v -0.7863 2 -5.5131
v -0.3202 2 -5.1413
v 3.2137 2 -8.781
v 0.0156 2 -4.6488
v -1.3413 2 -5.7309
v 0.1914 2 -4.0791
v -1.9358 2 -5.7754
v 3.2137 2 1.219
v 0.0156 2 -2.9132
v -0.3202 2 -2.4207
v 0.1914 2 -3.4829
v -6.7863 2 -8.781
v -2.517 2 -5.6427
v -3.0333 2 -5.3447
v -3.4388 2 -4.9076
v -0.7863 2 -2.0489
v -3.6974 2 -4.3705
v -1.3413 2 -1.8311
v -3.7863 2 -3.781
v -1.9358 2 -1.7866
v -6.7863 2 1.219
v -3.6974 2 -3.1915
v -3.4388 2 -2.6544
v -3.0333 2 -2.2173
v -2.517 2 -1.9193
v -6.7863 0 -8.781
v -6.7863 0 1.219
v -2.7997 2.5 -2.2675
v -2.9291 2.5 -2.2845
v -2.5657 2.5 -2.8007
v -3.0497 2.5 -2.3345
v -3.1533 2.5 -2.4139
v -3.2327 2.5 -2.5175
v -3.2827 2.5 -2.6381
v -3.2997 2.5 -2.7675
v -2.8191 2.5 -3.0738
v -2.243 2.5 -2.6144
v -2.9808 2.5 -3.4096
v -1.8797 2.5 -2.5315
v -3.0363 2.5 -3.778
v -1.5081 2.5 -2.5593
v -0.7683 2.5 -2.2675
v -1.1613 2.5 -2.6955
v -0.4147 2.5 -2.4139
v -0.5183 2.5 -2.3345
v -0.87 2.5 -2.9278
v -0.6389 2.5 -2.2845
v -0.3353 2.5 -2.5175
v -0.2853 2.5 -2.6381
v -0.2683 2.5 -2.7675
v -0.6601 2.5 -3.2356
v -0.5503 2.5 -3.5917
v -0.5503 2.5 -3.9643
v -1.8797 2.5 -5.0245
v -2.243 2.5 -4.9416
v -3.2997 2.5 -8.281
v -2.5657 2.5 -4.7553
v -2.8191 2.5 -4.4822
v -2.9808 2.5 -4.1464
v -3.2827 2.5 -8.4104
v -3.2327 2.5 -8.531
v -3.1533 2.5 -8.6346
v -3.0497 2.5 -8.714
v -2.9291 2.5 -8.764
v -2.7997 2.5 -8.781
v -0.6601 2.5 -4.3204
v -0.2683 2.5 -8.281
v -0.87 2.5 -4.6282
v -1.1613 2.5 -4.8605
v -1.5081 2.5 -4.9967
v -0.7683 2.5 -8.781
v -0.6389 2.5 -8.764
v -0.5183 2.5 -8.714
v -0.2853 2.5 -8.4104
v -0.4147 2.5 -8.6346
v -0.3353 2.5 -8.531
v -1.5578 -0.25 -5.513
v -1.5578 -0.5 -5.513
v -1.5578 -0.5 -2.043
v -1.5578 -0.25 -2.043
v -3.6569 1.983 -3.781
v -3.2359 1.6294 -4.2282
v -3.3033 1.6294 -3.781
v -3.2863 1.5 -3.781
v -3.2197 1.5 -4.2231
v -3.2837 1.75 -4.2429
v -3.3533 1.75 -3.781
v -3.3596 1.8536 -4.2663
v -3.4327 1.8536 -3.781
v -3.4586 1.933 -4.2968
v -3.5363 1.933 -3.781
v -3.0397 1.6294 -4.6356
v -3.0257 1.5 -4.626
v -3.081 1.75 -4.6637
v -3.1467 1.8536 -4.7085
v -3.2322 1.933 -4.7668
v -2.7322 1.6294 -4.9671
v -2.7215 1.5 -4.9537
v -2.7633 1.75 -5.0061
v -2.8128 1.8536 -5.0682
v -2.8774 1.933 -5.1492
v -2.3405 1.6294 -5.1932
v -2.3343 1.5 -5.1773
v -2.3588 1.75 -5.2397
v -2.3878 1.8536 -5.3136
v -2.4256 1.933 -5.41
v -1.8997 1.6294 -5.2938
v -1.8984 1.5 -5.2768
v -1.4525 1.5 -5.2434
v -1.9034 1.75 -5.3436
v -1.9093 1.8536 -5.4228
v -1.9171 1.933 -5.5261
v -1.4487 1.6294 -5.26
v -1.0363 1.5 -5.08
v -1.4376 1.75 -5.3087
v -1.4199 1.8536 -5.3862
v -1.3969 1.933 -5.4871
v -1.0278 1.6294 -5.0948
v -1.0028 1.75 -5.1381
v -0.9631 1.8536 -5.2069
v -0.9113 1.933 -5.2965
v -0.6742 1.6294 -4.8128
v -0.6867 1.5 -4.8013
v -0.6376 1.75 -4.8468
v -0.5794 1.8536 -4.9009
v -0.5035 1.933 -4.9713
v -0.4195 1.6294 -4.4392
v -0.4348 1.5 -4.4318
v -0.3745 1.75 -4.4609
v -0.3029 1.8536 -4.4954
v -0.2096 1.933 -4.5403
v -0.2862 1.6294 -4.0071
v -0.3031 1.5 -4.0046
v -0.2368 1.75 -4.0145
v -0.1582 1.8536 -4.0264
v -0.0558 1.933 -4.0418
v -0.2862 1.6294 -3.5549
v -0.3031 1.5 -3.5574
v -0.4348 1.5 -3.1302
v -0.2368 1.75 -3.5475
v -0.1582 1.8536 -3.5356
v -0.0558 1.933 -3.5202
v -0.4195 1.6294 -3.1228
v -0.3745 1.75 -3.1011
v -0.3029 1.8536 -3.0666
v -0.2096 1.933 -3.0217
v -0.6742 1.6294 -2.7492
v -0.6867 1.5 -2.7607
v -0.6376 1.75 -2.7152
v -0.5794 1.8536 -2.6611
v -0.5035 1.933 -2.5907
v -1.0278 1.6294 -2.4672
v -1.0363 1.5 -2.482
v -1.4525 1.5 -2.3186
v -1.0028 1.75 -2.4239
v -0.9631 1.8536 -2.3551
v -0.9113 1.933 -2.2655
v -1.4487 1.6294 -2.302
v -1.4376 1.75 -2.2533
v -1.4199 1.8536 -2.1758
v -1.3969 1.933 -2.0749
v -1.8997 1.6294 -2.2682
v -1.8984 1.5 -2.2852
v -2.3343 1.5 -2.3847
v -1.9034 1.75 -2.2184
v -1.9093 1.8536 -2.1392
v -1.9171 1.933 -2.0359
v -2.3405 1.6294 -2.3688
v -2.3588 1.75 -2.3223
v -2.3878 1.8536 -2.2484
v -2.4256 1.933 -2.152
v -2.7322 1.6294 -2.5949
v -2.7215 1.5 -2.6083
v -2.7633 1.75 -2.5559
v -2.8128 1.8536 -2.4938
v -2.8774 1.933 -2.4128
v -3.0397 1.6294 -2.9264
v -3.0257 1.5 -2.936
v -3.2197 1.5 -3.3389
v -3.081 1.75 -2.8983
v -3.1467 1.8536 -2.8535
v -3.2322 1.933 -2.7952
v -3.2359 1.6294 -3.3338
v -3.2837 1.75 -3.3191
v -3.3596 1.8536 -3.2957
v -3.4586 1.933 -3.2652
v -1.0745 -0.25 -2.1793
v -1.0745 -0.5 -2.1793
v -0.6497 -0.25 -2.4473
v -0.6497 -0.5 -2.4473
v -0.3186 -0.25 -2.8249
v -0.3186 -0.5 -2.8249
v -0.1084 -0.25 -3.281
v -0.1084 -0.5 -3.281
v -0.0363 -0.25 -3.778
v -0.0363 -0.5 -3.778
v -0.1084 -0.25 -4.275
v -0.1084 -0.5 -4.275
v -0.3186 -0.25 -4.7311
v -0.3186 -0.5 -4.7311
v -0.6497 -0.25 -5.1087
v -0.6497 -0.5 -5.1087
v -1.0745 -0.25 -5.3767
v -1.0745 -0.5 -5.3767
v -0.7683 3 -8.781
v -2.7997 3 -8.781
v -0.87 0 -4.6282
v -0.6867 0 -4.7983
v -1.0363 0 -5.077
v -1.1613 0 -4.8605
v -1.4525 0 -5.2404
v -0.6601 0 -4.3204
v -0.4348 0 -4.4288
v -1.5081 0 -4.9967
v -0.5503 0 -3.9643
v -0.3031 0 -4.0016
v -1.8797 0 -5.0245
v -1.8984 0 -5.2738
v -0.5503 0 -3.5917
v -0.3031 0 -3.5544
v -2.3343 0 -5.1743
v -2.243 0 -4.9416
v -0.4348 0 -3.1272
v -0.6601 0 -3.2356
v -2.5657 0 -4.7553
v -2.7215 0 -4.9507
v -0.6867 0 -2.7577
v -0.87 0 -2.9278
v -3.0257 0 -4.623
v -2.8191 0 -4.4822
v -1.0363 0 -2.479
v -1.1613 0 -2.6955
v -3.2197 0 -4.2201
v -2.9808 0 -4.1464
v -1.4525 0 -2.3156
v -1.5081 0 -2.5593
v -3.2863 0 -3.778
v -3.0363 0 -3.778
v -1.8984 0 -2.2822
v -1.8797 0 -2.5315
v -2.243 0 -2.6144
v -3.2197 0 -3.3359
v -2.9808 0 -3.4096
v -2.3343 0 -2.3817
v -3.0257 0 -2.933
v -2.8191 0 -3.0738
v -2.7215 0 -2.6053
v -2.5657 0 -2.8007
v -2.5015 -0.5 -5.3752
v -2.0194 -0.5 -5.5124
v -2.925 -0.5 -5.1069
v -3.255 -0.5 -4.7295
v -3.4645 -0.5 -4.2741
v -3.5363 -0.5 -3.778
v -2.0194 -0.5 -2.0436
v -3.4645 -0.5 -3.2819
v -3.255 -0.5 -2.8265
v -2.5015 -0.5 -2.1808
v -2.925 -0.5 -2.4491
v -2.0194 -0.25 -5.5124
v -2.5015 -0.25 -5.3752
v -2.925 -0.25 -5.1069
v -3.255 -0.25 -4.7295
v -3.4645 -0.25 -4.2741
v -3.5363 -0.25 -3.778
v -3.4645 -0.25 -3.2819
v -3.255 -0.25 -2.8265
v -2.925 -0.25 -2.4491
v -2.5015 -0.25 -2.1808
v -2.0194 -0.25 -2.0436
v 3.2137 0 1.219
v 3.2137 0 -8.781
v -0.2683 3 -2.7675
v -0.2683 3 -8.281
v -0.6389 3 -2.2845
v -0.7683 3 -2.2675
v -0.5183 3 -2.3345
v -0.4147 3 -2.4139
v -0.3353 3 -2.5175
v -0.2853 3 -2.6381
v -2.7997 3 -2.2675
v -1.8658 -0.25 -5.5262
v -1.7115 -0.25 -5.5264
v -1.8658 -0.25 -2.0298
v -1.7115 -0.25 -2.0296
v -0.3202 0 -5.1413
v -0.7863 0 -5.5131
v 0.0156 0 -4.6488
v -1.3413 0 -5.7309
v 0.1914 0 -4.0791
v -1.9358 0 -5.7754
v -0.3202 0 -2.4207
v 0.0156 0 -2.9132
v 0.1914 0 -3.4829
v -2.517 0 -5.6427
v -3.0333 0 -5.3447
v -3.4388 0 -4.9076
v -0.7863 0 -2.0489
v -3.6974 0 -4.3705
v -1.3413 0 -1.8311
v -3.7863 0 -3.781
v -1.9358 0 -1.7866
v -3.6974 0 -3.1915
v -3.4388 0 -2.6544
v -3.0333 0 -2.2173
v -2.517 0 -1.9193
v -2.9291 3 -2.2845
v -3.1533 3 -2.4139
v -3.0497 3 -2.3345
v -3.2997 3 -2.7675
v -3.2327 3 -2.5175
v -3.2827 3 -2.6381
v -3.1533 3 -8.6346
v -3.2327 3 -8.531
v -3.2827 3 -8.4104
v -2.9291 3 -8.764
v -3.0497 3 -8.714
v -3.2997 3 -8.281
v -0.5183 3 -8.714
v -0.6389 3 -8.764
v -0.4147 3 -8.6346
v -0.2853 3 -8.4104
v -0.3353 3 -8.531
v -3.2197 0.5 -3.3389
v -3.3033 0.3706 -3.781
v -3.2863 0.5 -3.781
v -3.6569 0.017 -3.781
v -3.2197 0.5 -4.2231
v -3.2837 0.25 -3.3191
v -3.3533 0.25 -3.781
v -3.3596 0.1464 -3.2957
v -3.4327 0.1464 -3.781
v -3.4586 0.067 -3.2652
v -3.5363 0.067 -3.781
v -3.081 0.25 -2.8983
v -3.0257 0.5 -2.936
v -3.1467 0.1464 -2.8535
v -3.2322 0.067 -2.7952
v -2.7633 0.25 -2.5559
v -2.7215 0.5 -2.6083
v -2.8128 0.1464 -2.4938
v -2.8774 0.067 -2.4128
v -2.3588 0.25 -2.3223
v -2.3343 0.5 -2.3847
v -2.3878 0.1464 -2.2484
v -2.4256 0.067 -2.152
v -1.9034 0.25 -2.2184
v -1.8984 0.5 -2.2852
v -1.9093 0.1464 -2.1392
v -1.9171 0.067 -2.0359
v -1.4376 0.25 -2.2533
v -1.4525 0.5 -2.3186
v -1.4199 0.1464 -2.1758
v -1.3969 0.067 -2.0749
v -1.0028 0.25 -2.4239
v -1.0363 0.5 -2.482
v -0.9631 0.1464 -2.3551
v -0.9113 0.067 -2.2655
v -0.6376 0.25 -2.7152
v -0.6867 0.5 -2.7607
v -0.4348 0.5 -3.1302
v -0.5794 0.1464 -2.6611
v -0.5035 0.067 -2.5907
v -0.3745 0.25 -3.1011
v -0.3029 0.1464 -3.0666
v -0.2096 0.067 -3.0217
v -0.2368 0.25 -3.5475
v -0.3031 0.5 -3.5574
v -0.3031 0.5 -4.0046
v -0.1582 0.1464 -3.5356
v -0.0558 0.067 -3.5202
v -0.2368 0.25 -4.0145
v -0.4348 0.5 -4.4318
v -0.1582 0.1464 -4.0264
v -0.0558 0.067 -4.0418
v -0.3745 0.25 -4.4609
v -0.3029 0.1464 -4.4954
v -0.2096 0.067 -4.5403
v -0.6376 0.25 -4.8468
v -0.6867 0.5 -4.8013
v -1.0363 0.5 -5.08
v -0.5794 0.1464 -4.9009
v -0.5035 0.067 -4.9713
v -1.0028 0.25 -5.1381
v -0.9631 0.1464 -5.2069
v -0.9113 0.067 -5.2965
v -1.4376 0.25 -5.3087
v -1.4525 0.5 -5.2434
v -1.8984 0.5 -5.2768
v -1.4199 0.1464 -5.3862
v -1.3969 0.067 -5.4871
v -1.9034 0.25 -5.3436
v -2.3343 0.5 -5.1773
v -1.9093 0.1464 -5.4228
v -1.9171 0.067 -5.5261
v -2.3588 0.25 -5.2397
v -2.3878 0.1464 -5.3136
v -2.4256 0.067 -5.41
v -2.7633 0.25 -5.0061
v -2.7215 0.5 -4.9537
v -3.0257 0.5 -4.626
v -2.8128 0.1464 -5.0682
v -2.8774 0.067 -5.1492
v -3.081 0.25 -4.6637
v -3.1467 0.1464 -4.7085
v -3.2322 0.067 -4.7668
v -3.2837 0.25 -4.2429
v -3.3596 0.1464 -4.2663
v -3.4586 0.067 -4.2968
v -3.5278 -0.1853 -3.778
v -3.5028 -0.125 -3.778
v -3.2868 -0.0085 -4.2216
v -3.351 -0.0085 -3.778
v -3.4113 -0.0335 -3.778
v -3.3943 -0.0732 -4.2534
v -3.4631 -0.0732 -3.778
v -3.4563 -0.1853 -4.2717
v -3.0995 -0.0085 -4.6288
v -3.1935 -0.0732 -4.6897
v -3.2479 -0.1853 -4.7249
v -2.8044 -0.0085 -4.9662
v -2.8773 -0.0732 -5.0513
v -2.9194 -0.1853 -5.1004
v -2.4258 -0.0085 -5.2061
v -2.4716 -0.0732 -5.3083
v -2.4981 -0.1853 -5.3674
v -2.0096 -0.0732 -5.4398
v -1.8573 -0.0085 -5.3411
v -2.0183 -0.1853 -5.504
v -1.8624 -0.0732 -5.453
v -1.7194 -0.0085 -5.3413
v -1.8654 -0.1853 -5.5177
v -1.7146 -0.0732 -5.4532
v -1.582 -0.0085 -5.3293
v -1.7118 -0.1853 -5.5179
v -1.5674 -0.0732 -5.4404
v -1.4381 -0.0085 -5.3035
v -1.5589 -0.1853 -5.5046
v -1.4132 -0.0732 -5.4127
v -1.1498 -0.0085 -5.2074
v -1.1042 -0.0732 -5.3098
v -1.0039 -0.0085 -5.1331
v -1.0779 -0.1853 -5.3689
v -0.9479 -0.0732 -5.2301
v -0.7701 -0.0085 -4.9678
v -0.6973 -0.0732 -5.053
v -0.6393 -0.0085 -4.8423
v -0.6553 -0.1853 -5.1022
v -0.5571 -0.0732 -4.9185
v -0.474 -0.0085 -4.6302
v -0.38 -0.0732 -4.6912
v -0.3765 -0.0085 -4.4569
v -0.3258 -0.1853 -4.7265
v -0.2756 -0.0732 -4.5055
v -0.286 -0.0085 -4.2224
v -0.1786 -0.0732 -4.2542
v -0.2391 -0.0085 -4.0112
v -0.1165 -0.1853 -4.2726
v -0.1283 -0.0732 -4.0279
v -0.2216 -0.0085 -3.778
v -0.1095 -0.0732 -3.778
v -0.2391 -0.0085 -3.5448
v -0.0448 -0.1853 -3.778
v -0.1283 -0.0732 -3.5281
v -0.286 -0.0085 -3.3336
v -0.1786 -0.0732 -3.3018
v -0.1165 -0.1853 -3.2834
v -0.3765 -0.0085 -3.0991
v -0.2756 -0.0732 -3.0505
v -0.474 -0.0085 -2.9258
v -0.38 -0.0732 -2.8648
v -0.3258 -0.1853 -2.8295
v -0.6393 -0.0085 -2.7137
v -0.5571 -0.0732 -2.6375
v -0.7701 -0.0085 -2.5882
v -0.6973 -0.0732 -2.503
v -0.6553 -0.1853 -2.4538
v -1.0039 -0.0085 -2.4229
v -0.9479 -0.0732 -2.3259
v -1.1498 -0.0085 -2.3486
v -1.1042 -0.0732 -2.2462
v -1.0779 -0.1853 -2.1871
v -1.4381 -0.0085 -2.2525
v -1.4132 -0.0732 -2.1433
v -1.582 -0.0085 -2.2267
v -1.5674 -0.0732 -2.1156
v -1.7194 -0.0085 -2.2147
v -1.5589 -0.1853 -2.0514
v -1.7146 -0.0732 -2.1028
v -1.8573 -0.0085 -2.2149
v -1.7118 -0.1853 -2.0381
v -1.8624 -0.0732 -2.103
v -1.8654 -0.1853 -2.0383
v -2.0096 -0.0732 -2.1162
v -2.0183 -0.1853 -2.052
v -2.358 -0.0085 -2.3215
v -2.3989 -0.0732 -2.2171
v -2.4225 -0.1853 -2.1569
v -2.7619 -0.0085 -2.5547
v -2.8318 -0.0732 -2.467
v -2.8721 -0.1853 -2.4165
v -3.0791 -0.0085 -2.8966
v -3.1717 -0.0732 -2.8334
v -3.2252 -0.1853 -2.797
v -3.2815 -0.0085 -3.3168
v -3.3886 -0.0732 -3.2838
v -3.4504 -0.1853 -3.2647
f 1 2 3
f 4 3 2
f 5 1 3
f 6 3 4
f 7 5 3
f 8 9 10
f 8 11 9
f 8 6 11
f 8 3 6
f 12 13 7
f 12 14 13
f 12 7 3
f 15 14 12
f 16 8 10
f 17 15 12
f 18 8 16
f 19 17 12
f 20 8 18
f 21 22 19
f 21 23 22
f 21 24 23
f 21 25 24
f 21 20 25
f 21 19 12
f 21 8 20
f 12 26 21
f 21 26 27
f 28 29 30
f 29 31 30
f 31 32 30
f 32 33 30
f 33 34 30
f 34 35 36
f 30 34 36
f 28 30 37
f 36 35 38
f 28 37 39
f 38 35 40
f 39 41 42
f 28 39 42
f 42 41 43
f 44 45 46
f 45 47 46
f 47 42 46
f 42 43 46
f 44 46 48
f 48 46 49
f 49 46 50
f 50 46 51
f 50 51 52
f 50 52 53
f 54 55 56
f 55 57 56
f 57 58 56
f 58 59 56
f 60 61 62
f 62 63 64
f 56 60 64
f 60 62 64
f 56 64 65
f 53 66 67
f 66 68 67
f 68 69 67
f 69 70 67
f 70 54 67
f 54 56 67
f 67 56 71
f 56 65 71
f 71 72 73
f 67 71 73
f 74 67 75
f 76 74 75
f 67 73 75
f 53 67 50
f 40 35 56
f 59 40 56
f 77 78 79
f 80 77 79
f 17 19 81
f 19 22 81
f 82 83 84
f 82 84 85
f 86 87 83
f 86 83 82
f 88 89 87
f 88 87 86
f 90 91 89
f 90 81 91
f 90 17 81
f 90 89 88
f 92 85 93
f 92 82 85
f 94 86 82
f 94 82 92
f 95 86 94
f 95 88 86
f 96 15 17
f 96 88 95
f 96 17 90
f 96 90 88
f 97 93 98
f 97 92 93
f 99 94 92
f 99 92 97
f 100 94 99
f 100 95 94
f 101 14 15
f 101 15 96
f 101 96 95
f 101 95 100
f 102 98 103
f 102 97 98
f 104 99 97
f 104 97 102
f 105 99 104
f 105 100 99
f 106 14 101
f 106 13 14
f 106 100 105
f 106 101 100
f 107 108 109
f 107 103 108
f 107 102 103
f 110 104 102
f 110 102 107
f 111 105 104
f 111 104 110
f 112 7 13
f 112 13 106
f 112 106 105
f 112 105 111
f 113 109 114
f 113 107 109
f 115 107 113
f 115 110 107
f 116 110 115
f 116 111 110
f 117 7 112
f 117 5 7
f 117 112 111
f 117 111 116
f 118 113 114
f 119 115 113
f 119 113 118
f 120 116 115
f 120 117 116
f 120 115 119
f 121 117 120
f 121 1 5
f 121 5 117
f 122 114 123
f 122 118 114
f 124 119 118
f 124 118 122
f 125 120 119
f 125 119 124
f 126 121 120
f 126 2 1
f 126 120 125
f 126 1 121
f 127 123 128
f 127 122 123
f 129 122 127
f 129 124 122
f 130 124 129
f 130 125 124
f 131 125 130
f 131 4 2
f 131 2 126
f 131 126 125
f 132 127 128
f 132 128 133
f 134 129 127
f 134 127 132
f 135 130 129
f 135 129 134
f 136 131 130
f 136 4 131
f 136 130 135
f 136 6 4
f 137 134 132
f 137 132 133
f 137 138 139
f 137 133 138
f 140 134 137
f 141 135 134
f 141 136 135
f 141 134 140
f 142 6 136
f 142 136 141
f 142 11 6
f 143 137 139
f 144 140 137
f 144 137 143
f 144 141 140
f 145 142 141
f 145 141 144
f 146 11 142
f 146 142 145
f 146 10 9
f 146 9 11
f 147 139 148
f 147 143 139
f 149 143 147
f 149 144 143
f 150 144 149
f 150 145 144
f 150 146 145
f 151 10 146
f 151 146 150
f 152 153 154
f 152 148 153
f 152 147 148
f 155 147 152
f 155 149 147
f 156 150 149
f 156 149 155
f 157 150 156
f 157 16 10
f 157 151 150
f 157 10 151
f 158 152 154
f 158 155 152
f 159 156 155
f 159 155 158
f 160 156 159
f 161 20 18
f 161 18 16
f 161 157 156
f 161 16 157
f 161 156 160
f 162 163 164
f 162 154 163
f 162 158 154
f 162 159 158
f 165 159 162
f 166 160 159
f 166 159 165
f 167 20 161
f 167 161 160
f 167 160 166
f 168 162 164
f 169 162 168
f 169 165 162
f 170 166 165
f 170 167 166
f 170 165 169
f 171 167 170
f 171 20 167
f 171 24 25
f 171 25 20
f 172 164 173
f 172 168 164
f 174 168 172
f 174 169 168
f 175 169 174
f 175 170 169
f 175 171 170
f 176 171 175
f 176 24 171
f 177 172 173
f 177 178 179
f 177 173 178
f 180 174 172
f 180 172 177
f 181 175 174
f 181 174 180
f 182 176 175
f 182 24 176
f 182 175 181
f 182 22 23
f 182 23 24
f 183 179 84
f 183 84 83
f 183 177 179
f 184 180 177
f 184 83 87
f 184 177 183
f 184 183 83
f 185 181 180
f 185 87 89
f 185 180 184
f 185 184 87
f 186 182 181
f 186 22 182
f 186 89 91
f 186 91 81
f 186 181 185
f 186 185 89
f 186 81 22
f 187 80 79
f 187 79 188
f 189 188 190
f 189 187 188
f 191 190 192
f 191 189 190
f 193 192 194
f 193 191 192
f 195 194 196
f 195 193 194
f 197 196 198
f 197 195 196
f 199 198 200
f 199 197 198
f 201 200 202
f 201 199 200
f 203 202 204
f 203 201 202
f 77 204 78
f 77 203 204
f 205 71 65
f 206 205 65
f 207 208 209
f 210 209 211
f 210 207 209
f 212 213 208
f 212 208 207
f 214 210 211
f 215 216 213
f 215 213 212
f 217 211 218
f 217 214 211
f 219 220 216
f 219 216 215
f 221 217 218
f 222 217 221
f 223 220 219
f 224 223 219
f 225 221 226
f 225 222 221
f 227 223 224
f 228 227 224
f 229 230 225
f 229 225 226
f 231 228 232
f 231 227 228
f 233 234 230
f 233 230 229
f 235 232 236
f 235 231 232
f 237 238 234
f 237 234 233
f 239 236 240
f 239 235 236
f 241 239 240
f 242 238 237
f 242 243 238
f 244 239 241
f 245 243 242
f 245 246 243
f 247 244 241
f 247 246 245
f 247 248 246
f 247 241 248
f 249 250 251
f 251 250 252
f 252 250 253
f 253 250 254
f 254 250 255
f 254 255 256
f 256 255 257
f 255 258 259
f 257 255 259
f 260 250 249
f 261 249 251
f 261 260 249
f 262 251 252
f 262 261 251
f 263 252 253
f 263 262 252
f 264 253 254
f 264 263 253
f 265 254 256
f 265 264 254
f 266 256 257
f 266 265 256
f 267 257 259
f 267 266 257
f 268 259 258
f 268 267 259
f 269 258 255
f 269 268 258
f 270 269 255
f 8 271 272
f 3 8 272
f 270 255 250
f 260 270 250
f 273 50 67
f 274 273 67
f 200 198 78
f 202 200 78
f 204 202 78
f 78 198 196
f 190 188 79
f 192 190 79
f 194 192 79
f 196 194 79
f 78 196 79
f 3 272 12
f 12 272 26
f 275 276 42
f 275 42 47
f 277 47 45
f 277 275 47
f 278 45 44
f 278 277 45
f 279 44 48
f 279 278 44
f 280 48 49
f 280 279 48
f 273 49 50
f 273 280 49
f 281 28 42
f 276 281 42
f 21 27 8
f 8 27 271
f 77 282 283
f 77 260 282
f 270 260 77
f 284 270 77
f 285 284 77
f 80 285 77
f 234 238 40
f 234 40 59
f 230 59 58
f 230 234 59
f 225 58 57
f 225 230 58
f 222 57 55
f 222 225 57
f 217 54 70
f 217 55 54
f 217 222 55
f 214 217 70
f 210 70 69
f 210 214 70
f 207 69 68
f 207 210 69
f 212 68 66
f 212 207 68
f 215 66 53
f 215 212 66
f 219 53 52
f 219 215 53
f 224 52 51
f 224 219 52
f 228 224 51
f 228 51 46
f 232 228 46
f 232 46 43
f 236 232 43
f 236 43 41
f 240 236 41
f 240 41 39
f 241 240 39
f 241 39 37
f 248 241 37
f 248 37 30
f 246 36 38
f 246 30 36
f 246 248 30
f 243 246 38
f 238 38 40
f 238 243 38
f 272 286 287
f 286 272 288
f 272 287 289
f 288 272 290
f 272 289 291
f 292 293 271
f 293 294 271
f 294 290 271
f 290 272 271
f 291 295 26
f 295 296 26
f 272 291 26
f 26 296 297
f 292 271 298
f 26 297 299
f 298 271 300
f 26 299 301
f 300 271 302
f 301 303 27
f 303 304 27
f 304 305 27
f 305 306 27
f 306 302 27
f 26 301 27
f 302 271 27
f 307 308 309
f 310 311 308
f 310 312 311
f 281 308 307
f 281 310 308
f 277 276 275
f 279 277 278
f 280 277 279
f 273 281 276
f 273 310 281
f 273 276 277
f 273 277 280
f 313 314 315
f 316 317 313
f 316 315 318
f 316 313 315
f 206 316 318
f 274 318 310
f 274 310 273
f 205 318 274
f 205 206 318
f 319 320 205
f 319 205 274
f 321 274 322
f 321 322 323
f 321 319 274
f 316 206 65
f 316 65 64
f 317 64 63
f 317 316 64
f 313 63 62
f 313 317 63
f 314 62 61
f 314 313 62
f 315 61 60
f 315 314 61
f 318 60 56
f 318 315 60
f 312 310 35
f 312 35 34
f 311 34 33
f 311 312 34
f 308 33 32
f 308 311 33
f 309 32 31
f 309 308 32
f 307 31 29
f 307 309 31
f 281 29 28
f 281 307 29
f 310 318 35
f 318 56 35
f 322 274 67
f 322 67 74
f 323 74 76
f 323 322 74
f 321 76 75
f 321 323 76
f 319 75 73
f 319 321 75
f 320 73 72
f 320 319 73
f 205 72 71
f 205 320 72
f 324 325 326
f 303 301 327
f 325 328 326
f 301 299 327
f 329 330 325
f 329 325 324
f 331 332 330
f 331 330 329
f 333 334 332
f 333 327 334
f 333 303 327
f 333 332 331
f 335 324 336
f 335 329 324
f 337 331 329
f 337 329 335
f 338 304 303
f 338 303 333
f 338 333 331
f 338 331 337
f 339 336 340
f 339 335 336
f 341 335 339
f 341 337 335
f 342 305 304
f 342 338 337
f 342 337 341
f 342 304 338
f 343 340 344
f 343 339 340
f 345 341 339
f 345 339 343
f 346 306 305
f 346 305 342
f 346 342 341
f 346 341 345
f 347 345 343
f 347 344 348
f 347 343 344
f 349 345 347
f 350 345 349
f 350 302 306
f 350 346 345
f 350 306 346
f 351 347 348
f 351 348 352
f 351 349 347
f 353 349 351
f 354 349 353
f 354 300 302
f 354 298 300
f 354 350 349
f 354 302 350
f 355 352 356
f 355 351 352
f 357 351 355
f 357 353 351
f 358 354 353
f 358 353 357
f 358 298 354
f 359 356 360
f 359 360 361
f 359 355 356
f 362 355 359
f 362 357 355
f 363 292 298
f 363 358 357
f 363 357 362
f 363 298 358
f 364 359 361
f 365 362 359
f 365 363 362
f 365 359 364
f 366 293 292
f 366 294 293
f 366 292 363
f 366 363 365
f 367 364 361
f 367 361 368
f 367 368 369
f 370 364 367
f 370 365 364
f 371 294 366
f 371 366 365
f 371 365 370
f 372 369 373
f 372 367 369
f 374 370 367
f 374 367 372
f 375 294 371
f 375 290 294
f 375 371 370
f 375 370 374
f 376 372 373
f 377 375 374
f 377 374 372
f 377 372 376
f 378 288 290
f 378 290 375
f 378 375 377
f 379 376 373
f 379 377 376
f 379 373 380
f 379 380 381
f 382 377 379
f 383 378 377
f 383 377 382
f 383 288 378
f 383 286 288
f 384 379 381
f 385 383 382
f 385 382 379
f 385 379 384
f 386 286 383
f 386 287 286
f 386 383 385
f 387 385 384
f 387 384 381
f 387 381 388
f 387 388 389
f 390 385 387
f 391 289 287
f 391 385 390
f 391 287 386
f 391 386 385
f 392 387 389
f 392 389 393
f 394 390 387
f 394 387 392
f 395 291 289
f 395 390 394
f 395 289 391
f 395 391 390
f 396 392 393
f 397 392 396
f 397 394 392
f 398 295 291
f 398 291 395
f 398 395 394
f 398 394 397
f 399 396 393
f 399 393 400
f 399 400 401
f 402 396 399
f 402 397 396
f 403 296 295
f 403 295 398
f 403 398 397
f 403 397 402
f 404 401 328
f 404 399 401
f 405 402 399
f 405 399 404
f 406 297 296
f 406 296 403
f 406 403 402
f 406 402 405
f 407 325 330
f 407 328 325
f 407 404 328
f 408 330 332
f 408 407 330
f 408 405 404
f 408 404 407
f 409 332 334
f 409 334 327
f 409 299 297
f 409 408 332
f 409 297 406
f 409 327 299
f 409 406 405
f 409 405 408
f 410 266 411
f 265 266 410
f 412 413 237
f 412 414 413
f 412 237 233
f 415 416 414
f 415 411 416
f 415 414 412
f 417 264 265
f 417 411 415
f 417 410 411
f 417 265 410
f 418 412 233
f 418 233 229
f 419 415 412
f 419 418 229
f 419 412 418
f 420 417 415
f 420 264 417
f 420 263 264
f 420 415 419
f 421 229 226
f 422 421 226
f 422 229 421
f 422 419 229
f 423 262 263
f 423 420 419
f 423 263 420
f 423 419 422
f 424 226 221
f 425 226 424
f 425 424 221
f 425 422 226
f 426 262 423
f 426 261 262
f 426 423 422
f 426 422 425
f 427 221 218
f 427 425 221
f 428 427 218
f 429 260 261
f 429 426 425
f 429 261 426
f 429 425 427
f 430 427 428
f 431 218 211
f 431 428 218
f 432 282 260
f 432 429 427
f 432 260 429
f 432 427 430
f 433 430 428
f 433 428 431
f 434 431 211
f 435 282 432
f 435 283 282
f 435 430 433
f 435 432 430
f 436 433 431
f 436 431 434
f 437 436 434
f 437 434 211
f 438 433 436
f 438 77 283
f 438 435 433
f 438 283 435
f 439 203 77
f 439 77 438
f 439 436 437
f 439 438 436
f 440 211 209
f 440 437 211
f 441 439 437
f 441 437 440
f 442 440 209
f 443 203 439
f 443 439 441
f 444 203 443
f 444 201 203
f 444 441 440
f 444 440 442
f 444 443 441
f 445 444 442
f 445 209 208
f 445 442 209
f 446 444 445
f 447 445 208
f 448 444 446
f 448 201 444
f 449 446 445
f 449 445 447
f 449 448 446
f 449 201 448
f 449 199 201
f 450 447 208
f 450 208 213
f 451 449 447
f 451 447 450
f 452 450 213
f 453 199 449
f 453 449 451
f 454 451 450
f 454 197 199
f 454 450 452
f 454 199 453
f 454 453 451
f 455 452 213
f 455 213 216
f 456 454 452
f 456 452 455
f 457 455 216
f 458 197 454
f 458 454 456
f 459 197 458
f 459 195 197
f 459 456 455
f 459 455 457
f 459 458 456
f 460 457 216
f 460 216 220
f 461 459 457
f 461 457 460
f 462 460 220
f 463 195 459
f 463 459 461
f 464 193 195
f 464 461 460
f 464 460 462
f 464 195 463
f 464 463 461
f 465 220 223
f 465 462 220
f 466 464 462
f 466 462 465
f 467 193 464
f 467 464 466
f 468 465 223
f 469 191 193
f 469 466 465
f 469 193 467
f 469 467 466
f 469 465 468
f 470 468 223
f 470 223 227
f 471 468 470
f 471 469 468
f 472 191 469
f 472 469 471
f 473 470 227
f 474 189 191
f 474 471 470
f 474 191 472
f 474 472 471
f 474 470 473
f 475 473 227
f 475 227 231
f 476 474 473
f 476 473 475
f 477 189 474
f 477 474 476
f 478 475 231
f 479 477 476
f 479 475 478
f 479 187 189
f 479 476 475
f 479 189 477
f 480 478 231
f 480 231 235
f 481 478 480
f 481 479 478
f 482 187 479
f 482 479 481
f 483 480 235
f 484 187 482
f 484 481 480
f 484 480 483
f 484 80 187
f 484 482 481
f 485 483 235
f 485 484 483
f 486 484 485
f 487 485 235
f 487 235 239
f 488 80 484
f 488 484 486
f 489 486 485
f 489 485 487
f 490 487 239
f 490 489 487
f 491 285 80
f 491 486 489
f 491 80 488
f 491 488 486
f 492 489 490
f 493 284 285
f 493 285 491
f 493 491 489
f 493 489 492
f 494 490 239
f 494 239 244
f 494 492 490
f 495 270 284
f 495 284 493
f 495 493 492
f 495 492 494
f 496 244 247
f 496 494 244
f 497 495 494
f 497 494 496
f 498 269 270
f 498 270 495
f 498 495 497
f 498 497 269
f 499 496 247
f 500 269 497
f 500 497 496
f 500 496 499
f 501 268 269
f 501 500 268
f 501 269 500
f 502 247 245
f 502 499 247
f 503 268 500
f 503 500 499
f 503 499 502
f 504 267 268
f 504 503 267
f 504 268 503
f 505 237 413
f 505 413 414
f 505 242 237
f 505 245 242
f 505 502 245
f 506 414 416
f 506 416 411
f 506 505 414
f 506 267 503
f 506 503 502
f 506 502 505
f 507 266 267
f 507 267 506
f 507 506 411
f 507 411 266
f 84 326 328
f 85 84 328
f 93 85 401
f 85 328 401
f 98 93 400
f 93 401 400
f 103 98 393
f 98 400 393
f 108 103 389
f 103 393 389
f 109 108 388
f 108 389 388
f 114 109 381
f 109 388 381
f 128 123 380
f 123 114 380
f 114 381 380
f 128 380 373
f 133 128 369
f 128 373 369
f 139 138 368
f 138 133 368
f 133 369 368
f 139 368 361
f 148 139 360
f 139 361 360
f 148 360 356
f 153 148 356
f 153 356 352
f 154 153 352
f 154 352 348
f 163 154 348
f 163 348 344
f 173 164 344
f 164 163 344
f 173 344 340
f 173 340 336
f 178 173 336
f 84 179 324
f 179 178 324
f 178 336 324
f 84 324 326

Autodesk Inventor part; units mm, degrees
ref_plane "YZ Plane" through (0, 0, 0) normal (1, 0, 0) x (0, 1, 0)
ref_plane "XZ Plane" through (0, 0, 0) normal (0, 1, 0) x (-1, 0, 0)
ref_plane "XY Plane" through (0, 0, 0) normal (0, 0, 1) x (1, 0, 0)
sketch "Sketch1" plane through (0, 0, 0) normal (0, 1, 0) x (-1, 0, 0)
  line L0 (6.7863, 1.219) -> (-3.2137, 1.219)
  line L1 (-3.2137, 1.219) -> (-3.2137, -8.781)
  line L2 (-3.2137, -8.781) -> (6.7863, -8.781)
  line L3 (6.7863, -8.781) -> (6.7863, 1.219)
  circle A0 centre (1.7863, -3.781) radius 1.5
  point P0 (0, 0)
  dimension "d0" = 10
  dimension "d1" = 10
  dimension "d2" = 3
extrude "Extrusion1" add sketch "Sketch1" along normal blind 2
fillet "Fillet1" radius 0.5 1 edges at (-0.2863, 2, -3.781)
fillet "Fillet2" radius 0.5 1 edges at (-0.2863, 0, -3.781)
sketch "Sketch3" plane through (0, 0, 0) normal (0, 1, 0) x (-1, 0, 0)
  circle A0 centre (1.7863, -3.778) radius 1.25
  circle A1 centre (1.7863, -3.778) radius 1.75
  circle A2 centre (1.7863, -3.781) radius 1.5 projected
  point P0 (0, 0)
  dimension "d10" = 0
  dimension "d11" = 2.5
  dimension "d12" = 3.5
extrude "Extrusion2" add sketch "Sketch3" against normal blind 0.5 contours A0 | A1 | A2
extrude "Extrusion3" add sketch "Sketch3" along normal blind 2.5 contours A0
sketch "Sketch4" plane through (-1.7863, 2.5, -3.778) normal (0, 1, 0) x (1, 0, 0)
  line L0 (5, 5.003) -> (-5, 5.003) projected
  line L1 (-1.5134, -1.5105) -> (1.518, -1.5105)
  line L2 (1.518, -1.5105) -> (1.518, 5.003)
  line L3 (1.518, 5.003) -> (-1.5134, 5.003)
  line L4 (-1.5134, 5.003) -> (-1.5134, -1.5105)
  point P0 (1.7863, -3.778)
extrude "Extrusion4" add sketch "Sketch4" along normal blind 0.5
fillet "Fillet3" radius 0.5 4 edges at (-0.2683, 2.75, -2.2675) (-0.2683, 2.75, -8.781) (-3.2997, 2.75, -8.781) (-3.2997, 2.75, -2.2675)
fillet "Fillet4" radius 0.25 1 edges at (-0.0363, 0, -3.778)
sketch "Sketch5" plane through (-1.7863, -0.5, -3.778) normal (0, -1, 0) x (1, 0, 0)
  line L0 (-0.2331, -1.784) -> (0.2285, -1.784)
  line L1 (0.2285, -1.784) -> (0.2285, 1.842)
  line L2 (0.2285, 1.842) -> (-0.2331, 1.842)
  line L3 (-0.2331, 1.842) -> (-0.2331, -1.784)
  point P0 (1.7863, 3.778)
extrude "Extrusion5" cut sketch "Sketch5" against normal blind 0.25
properties part number "Lock"
